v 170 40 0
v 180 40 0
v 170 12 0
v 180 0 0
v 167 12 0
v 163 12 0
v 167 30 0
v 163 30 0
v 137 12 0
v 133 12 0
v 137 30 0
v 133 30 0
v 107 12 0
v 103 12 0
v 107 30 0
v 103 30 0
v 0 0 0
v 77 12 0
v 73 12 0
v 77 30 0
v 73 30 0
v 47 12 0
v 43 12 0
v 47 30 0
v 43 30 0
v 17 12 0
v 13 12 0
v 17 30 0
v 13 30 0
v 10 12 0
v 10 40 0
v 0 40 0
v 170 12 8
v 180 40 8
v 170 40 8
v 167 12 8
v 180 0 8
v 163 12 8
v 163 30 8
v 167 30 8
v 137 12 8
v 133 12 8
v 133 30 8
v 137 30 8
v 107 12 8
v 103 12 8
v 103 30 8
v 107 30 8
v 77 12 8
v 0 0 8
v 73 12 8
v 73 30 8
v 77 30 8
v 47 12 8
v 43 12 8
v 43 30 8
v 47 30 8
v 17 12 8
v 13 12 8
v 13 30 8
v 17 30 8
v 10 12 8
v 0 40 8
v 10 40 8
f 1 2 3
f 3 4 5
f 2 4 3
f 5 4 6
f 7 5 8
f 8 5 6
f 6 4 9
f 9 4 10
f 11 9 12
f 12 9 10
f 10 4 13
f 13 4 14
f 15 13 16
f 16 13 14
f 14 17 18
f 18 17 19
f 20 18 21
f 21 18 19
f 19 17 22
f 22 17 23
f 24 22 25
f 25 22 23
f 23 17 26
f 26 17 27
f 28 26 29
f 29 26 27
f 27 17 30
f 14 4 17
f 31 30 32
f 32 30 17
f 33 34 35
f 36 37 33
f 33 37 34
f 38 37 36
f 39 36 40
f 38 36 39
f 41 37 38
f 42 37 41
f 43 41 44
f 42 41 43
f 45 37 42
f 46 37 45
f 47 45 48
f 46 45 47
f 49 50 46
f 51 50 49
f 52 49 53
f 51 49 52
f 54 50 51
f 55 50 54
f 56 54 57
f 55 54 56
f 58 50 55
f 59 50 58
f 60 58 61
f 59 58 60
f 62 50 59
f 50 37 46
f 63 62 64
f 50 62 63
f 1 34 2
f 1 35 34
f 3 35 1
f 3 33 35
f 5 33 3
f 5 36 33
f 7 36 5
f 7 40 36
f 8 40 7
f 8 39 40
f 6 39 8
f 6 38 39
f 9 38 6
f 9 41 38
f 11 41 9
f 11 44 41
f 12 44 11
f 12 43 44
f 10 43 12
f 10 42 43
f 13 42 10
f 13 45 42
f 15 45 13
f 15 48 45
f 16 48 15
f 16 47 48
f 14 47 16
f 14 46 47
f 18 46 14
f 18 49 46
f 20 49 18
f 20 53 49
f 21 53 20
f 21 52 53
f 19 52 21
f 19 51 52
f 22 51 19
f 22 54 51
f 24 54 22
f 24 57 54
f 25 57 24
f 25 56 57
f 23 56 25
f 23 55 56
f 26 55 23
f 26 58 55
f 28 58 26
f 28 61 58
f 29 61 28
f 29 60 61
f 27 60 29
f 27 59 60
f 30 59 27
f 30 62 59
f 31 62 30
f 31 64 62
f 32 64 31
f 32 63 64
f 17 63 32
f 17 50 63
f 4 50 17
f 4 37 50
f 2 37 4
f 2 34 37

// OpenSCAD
$fn = 32;

// ----------------------------------------------------------------------
// Guard grille: 6 slats over a 180 x 40 mm plate
// ----------------------------------------------------------------------

// --- parameters (mm) ---
profile_height = 8;       // extrusion height
profile_points = 32;      // points of the closed outline

profile = [[0, 0], [180, 0], [180, 40], [170, 40], [170, 12], [167, 12], [167, 30], [163, 30], [163, 12], [137, 12], [137, 30], [133, 30], [133, 12], [107, 12], [107, 30], [103, 30], [103, 12], [77, 12], [77, 30], [73, 30], [73, 12], [47, 12], [47, 30], [43, 30], [43, 12], [17, 12], [17, 30], [13, 30], [13, 12], [10, 12], [10, 40], [0, 40]];  // single closed polygon, 32 points, counter clockwise

// --- the one profile operation ---
linear_extrude(height = profile_height) polygon(points = profile);
